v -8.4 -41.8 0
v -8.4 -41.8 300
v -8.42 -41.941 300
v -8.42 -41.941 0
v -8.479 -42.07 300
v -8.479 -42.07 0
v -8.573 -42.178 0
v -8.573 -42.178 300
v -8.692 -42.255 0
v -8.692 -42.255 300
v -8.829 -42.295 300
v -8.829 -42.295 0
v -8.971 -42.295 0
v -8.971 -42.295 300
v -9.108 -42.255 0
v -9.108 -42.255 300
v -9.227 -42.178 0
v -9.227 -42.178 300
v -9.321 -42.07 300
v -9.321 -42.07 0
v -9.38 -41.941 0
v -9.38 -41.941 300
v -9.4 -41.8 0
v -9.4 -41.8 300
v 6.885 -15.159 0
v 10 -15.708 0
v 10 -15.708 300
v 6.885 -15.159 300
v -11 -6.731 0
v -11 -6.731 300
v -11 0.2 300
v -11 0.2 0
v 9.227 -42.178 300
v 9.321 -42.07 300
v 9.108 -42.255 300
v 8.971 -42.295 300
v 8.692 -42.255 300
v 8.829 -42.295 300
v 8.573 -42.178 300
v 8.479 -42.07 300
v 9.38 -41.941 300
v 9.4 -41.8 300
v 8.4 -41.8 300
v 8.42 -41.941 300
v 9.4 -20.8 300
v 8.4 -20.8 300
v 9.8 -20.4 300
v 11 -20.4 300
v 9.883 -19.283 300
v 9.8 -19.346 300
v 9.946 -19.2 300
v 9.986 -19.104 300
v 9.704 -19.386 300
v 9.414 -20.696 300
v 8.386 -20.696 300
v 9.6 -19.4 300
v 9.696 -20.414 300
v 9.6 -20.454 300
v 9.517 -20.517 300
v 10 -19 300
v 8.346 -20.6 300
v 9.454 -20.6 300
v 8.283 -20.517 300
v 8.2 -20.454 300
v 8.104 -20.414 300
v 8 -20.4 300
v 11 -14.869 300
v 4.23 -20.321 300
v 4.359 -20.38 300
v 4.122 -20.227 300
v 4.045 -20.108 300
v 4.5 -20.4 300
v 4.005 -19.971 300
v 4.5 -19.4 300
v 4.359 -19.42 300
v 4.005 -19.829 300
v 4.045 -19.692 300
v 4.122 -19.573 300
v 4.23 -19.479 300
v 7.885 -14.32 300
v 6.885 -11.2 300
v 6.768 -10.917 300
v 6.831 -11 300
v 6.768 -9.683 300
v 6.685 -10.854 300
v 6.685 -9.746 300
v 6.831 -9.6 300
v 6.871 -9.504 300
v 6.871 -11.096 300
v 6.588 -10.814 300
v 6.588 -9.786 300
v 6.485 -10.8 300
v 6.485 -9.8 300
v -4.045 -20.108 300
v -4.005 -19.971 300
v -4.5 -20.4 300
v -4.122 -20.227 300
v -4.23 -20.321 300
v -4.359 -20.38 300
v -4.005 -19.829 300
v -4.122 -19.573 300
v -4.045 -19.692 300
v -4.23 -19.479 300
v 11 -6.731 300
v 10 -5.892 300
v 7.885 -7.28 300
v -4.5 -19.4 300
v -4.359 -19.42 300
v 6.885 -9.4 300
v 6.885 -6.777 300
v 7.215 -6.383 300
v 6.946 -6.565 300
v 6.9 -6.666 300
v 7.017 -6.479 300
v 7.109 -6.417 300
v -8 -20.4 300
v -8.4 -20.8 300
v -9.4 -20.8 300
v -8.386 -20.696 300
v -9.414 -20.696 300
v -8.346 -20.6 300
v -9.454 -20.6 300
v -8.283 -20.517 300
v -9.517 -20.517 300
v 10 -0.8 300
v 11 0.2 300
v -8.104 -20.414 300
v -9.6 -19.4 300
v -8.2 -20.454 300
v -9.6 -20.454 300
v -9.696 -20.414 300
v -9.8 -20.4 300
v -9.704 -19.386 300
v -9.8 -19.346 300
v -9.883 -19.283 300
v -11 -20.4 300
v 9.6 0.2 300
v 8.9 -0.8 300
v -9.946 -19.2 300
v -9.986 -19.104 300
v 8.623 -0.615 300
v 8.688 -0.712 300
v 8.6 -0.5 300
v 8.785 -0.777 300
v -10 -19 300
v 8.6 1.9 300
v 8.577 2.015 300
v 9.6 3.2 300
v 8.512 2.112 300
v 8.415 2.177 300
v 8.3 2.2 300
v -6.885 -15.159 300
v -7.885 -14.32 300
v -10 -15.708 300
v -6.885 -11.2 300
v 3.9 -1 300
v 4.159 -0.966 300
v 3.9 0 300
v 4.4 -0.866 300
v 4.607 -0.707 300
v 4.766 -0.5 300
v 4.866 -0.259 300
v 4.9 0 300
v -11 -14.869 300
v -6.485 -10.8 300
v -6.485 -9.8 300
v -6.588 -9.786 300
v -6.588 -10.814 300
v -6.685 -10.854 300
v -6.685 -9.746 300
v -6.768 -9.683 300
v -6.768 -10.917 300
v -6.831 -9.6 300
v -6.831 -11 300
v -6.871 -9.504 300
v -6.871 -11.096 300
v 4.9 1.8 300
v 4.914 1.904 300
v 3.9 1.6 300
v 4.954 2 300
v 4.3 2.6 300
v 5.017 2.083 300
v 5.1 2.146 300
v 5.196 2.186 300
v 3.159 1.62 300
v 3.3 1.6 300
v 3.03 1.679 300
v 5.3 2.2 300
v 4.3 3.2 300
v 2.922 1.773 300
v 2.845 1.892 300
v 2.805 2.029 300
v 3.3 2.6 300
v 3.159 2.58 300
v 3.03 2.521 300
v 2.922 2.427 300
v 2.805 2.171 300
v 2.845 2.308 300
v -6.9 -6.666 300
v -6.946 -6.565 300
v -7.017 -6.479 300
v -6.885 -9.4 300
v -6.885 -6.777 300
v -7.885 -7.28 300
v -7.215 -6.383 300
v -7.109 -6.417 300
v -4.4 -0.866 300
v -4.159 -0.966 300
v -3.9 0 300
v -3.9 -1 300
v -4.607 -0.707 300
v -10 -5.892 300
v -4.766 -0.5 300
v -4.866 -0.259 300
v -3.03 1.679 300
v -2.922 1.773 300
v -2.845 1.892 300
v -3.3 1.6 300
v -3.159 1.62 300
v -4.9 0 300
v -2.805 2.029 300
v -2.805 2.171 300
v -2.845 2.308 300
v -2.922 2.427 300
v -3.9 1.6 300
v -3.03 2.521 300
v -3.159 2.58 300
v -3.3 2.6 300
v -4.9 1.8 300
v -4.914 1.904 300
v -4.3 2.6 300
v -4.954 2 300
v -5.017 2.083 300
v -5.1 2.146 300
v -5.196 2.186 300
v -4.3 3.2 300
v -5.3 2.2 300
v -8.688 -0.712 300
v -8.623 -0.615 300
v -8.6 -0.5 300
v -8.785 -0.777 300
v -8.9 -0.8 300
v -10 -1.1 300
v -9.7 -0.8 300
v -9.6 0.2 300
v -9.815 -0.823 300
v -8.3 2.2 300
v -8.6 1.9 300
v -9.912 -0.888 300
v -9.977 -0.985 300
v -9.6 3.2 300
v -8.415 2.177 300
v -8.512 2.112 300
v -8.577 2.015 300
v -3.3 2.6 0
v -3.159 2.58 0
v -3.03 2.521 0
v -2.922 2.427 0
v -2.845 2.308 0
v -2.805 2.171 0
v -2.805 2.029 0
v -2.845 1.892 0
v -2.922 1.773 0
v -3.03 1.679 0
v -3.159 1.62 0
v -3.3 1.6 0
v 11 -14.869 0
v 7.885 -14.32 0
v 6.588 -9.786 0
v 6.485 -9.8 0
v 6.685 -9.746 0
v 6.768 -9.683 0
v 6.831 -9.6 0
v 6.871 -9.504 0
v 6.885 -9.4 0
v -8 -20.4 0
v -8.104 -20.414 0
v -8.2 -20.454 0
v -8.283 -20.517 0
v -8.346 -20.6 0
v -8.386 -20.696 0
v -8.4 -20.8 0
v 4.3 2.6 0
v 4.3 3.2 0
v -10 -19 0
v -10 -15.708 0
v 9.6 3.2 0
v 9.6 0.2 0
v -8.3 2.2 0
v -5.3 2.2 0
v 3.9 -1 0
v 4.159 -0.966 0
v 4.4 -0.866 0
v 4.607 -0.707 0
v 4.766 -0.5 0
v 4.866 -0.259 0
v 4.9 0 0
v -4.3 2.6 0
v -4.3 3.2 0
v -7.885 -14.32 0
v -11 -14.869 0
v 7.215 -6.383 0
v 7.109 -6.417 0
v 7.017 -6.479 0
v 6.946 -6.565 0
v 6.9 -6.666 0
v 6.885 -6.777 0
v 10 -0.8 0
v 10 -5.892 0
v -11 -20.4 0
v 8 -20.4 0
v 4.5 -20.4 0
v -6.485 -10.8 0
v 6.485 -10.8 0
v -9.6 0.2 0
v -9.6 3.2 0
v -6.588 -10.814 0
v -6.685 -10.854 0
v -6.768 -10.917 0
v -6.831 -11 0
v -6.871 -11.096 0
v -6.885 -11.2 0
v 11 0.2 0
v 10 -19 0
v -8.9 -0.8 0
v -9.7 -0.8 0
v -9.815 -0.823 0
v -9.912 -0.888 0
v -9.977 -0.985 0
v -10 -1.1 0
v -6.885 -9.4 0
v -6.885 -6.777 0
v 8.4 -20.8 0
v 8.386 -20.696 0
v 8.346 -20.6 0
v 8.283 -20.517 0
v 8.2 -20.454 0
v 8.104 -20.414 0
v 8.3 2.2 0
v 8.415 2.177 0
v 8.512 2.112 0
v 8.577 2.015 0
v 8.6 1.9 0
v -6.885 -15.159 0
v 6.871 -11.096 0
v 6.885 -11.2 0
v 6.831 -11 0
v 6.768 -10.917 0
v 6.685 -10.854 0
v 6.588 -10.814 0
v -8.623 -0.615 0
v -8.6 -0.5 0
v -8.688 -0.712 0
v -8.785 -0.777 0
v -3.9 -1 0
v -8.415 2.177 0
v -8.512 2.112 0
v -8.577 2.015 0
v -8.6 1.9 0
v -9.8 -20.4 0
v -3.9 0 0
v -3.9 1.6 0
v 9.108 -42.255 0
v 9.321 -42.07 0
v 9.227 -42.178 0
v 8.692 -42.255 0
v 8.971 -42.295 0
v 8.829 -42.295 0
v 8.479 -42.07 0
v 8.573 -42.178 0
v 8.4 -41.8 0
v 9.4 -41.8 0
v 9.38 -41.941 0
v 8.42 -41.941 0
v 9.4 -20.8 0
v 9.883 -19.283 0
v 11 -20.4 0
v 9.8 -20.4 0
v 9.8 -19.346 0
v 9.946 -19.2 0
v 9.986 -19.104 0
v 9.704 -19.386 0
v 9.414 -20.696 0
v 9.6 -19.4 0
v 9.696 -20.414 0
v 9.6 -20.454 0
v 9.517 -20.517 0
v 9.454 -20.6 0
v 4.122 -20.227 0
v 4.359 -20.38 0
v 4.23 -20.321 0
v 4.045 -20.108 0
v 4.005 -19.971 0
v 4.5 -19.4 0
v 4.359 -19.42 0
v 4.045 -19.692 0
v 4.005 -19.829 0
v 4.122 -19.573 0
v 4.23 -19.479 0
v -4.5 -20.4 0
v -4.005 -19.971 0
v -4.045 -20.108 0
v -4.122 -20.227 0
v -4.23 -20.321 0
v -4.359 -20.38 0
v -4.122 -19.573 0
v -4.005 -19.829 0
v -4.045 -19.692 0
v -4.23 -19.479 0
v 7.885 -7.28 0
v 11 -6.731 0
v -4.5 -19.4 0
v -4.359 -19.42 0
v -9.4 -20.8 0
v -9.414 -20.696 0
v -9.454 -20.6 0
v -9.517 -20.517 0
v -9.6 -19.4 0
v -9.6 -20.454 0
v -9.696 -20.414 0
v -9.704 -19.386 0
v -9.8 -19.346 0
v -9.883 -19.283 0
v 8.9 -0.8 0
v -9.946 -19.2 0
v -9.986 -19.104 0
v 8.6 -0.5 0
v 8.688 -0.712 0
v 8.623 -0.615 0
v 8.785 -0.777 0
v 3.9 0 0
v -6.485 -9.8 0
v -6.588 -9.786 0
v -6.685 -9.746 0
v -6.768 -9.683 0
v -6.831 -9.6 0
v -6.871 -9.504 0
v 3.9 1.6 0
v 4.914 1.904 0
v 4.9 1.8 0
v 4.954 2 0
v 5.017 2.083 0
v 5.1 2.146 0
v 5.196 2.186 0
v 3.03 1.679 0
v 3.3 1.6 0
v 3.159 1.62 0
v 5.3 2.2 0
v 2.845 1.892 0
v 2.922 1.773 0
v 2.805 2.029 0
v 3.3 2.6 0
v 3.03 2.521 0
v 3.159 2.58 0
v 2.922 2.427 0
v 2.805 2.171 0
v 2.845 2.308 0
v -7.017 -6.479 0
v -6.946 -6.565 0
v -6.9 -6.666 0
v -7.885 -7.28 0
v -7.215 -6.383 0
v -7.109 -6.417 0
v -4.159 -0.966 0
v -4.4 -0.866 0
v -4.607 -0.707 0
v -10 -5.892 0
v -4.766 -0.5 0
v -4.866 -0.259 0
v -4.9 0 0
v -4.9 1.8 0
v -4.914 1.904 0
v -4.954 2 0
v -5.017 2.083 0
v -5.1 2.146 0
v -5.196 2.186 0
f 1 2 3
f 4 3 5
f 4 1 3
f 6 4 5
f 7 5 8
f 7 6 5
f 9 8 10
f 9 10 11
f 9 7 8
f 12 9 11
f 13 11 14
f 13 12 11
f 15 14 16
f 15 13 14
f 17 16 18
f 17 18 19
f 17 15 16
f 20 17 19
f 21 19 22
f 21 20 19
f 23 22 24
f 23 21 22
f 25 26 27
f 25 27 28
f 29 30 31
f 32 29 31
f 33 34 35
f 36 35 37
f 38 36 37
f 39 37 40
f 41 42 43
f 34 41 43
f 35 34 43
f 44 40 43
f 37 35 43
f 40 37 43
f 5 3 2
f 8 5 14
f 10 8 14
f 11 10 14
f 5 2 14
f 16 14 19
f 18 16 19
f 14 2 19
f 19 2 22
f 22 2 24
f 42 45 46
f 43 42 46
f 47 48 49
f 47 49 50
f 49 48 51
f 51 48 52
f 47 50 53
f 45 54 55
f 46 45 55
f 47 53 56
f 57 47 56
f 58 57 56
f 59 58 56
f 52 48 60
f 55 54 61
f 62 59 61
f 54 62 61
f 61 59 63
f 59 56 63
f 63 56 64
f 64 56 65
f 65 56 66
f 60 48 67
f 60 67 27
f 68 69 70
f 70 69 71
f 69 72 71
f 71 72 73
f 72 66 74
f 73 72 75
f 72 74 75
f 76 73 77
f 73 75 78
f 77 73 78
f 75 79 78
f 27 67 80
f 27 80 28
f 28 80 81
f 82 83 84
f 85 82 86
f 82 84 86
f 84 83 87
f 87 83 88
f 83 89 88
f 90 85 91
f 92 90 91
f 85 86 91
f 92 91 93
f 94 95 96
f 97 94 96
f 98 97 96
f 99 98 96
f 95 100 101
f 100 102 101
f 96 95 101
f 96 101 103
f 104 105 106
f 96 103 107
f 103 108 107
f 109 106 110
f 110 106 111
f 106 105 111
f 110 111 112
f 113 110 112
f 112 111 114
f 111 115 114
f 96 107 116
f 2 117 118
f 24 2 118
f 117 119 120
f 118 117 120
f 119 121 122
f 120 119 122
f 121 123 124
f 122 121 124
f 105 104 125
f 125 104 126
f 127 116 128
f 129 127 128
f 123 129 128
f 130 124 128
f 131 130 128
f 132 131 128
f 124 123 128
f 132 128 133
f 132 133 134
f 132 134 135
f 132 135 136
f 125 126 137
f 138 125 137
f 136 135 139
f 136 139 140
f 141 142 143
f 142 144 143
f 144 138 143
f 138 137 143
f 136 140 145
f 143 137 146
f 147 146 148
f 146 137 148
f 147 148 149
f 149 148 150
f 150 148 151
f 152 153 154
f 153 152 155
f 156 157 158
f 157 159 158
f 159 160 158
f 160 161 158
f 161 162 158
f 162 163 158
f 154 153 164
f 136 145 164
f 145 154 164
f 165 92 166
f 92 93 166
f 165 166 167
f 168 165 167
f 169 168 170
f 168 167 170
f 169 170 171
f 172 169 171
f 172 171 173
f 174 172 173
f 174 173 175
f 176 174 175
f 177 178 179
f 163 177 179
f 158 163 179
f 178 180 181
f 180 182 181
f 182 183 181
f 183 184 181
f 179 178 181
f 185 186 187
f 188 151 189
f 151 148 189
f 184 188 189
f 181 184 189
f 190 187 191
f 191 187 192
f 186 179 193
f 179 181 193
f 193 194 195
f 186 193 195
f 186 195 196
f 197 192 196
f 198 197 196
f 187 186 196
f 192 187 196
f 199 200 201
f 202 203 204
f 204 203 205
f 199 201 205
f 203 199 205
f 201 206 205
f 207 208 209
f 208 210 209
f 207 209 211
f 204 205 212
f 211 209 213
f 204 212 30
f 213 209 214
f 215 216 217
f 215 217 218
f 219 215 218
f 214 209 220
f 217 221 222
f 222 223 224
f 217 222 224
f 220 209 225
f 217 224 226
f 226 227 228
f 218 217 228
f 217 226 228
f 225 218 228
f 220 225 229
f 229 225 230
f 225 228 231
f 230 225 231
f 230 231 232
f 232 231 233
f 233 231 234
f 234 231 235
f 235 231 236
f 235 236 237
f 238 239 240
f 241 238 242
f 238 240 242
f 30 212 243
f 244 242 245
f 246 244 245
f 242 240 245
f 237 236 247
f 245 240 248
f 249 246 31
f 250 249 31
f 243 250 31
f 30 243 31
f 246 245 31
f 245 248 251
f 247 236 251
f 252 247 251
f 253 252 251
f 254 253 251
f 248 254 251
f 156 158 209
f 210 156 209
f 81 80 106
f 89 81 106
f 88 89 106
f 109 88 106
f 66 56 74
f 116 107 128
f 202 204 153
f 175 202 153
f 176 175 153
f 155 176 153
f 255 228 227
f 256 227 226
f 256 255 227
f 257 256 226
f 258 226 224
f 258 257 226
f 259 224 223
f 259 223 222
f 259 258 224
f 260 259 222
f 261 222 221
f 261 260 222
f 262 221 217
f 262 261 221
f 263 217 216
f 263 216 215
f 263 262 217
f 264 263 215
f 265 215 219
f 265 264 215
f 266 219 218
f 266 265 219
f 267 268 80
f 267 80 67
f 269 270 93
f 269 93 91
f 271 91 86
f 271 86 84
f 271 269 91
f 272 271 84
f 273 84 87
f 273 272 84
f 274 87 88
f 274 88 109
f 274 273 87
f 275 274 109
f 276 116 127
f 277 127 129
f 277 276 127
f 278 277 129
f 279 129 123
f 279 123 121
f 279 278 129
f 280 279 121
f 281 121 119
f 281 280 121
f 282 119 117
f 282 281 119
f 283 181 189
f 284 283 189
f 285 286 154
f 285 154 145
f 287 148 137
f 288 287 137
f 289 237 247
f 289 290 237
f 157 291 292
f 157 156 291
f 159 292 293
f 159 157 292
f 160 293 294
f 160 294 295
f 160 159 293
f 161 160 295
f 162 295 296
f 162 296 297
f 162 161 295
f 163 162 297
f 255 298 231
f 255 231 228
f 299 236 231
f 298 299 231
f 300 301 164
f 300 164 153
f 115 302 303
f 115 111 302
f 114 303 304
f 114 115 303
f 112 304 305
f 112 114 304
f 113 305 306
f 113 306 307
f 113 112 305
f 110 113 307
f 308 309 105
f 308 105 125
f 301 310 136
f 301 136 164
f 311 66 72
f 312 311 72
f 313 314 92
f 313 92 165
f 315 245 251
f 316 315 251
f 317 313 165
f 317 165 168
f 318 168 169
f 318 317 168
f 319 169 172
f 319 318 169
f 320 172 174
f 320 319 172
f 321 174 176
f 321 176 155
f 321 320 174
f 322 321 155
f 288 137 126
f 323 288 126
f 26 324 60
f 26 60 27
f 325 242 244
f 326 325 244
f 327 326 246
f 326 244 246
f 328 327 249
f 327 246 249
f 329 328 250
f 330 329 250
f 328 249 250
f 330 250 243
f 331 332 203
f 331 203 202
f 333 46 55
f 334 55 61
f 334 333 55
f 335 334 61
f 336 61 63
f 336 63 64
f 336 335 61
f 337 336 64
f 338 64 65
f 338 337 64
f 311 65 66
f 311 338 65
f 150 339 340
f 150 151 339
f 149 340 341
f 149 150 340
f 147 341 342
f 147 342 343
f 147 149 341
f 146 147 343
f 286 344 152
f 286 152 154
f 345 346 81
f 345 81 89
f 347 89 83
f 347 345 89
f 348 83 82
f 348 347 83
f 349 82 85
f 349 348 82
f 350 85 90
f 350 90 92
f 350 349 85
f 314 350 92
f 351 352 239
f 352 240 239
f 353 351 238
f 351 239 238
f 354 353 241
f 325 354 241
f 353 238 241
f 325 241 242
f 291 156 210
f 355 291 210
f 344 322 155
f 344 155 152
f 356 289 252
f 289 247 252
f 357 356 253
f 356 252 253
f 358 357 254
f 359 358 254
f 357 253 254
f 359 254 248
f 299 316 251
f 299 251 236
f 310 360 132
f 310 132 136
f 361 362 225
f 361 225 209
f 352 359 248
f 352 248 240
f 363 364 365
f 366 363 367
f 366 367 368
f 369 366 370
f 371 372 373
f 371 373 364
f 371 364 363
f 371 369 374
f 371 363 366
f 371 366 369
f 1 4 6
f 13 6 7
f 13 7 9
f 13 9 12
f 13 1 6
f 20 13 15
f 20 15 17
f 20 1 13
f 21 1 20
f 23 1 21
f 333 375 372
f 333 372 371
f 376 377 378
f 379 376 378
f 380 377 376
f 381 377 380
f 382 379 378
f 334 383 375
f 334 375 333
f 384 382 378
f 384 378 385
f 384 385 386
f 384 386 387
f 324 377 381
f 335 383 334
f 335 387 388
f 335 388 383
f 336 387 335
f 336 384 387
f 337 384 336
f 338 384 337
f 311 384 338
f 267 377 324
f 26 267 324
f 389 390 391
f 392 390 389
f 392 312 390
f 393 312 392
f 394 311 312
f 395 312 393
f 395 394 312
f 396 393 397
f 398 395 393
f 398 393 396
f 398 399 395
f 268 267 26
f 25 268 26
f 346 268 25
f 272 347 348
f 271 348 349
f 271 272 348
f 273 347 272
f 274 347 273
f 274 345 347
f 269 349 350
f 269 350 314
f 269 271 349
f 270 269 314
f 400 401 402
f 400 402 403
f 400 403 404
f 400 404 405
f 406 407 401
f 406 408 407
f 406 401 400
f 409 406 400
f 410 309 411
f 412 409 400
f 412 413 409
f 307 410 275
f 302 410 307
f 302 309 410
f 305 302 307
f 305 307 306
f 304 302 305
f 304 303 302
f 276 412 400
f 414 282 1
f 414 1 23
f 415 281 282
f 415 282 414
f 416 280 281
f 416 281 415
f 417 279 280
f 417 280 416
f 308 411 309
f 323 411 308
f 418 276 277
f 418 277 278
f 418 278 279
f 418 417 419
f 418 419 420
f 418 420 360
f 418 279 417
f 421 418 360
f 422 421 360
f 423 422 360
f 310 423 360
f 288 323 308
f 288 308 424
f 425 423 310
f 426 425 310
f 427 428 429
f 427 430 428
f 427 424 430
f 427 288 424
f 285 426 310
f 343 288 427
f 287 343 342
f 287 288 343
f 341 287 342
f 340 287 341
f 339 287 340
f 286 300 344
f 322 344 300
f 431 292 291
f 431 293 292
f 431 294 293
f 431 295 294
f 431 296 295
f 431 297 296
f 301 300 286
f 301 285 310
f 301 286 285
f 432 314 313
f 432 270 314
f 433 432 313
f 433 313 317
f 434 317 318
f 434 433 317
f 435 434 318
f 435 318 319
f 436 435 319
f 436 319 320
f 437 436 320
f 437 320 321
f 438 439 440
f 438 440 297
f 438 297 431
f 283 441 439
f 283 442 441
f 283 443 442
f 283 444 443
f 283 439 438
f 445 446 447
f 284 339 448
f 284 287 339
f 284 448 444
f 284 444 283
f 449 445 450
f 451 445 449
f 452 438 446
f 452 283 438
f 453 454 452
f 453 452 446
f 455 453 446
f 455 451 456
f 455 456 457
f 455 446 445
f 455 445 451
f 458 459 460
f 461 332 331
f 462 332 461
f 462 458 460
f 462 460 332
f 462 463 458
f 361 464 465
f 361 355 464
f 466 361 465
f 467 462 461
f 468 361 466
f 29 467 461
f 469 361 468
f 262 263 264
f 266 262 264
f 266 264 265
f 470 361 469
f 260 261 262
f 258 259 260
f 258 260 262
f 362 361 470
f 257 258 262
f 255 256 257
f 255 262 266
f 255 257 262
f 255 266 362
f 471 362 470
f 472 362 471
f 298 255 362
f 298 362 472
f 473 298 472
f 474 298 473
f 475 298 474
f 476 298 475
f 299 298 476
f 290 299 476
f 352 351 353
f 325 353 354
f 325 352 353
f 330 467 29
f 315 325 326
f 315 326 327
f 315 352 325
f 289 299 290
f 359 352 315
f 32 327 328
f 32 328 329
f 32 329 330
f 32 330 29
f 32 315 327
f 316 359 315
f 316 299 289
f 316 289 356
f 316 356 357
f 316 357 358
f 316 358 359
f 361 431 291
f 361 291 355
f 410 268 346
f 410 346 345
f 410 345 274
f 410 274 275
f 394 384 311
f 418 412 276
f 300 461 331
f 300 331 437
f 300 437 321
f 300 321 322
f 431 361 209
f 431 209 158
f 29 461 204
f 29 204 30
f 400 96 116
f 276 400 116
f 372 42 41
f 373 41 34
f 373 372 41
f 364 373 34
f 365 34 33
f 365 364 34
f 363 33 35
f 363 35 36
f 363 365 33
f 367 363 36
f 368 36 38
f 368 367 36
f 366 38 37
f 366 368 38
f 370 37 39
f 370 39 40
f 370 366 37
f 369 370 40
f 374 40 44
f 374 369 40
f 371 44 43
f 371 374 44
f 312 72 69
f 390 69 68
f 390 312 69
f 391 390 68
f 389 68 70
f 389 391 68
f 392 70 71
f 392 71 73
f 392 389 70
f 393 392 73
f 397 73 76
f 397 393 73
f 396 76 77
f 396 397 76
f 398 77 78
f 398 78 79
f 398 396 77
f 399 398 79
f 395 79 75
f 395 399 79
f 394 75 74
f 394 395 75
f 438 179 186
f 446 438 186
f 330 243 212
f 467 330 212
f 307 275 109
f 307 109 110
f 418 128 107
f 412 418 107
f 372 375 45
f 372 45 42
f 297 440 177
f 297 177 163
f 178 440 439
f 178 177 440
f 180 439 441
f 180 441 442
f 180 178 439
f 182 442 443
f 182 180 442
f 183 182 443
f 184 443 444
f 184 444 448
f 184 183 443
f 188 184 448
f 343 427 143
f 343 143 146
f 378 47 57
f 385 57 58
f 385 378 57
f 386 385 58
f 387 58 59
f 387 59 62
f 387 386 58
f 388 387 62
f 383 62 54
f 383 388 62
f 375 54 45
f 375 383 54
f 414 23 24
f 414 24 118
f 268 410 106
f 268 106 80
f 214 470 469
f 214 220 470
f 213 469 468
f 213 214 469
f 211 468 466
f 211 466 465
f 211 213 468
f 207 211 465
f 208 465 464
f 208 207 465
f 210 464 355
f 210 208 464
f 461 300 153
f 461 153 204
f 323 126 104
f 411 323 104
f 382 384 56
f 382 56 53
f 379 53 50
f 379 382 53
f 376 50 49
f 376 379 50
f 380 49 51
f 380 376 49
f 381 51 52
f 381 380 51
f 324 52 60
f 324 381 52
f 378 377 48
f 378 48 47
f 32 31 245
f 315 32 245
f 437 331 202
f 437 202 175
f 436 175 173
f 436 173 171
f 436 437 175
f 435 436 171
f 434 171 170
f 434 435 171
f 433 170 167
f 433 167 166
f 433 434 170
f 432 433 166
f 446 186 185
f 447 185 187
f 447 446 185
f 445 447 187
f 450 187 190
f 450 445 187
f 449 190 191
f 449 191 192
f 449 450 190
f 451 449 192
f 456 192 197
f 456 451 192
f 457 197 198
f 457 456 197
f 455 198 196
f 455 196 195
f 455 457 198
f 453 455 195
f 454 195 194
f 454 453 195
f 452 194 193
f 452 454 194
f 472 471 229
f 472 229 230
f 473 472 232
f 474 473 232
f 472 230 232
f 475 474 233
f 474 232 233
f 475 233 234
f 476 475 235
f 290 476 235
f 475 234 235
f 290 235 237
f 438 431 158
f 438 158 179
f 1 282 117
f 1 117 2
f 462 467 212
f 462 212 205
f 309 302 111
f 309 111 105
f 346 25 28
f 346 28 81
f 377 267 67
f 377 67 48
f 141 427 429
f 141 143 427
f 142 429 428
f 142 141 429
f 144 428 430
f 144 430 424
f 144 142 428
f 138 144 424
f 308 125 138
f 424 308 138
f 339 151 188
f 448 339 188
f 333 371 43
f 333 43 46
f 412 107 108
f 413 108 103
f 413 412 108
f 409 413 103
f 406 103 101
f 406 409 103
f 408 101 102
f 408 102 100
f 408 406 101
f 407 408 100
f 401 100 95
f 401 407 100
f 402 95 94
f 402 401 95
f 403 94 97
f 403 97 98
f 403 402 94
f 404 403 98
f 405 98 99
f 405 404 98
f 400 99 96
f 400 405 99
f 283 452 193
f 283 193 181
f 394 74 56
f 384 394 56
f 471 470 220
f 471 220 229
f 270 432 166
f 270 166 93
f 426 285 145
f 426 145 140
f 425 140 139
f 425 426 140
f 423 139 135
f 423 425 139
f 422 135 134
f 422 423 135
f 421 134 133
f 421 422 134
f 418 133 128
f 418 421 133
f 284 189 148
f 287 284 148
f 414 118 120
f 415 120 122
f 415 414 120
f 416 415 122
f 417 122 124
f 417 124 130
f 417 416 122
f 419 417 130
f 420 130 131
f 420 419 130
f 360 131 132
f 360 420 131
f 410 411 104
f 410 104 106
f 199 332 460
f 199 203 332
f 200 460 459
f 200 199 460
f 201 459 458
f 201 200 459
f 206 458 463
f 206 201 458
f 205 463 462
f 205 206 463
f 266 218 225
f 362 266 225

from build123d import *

# Parameters (mm, degrees)
BOSS_EXTRUDE1_DEPTH = 300
FILLET1_R           = 1
FILLET2_R           = 0.3
SKETCH3_W           = 0.4
SKETCH3_H           = 0.6
CUT_EXTRUDE1_DEPTH  = 300
FILLET3_R           = 0.4


with BuildPart() as part:
    # Sketch1 → Boss-Extrude1 (new body)
    with BuildSketch(Plane.XY):
        with BuildLine():
            Line((-3.9, 0), (3.9, 0))
            Line((3.9, 0), (3.9, 1.6))
            Line((3.9, 1.6), (3.3, 1.6))
            ThreePointArc((3.3, 1.6), (2.8, 2.1), (3.3, 2.6))
            Line((3.3, 2.6), (4.3, 2.6))
            Line((4.3, 2.6), (4.3, 3.2))
            Line((4.3, 3.2), (9.6, 3.2))
            Line((9.6, 3.2), (9.6, 0.2))
            Line((9.6, 0.2), (11, 0.2))
            Line((11, 0.2), (11, -6.730696291))
            Line((11, -6.730696291), (7.88474386, -7.28))
            Line((7.88474386, -7.28), (7.88474386, -14.32))
            Line((7.88474386, -14.32), (11, -14.869303709))
            Line((11, -14.869303709), (11, -20.4))
            Line((11, -20.4), (9.8, -20.4))
            ThreePointArc((9.8, -20.4), (9.517157288, -20.517157288), (9.4, -20.8))
            Line((9.4, -20.8), (9.4, -41.8))
            ThreePointArc((9.4, -41.8), (8.9, -42.3), (8.4, -41.8))
            Line((8.4, -41.8), (8.4, -20.8))
            ThreePointArc((8.4, -20.8), (8.282842712, -20.517157288), (8, -20.4))
            Line((8, -20.4), (4.5, -20.4))
            ThreePointArc((4.5, -20.4), (4, -19.9), (4.5, -19.4))
            Line((4.5, -19.4), (8.4, -19.4))
            Line((8.4, -19.4), (9.6, -19.4))
            ThreePointArc((9.6, -19.4), (9.882842712, -19.282842712), (10, -19))
            Line((10, -19), (10, -15.70840334))
            Line((10, -15.70840334), (6.88474386, -15.159099631))
            Line((6.88474386, -15.159099631), (6.88474386, -11.2))
            ThreePointArc((6.88474386, -11.2), (6.767586572, -10.917157288), (6.48474386, -10.8))
            Line((6.48474386, -10.8), (-6.48474386, -10.8))
            ThreePointArc((-6.48474386, -10.8), (-6.767586572, -10.917157288), (-6.88474386, -11.2))
            Line((-6.88474386, -11.2), (-6.88474386, -15.159099631))
            Line((-6.88474386, -15.159099631), (-10, -15.70840334))
            Line((-10, -15.70840334), (-10, -19))
            ThreePointArc((-10, -19), (-9.882842712, -19.282842712), (-9.6, -19.4))
            Line((-9.6, -19.4), (-8.4, -19.4))
            Line((-8.4, -19.4), (-4.5, -19.4))
            ThreePointArc((-4.5, -19.4), (-4, -19.9), (-4.5, -20.4))
            Line((-4.5, -20.4), (-8, -20.4))
            ThreePointArc((-8, -20.4), (-8.282842712, -20.517157288), (-8.4, -20.8))
            Line((-8.4, -20.8), (-8.4, -41.8))
            ThreePointArc((-8.4, -41.8), (-8.9, -42.3), (-9.4, -41.8))
            Line((-9.4, -41.8), (-9.4, -20.8))
            ThreePointArc((-9.4, -20.8), (-9.517157288, -20.517157288), (-9.8, -20.4))
            Line((-9.8, -20.4), (-11, -20.4))
            Line((-11, -20.4), (-11, -14.869303709))
            Line((-11, -14.869303709), (-7.88474386, -14.32))
            Line((-7.88474386, -14.32), (-7.88474386, -7.28))
            Line((-7.88474386, -7.28), (-11, -6.730696291))
            Line((-11, -6.730696291), (-11, 0.2))
            Line((-11, 0.2), (-9.6, 0.2))
            Line((-9.6, 0.2), (-9.6, 3.2))
            Line((-9.6, 3.2), (-4.3, 3.2))
            Line((-4.3, 3.2), (-4.3, 2.6))
            Line((-4.3, 2.6), (-3.3, 2.6))
            ThreePointArc((-3.3, 2.6), (-2.8, 2.1), (-3.3, 1.6))
            Line((-3.3, 1.6), (-3.9, 1.6))
            Line((-3.9, 1.6), (-3.9, 0))
        make_face()
        with BuildLine():
            Line((-6.88474386, -6.440900369), (-6.88474386, -9.4))
            ThreePointArc((-6.88474386, -9.4), (-6.767586572, -9.682842712), (-6.48474386, -9.8))
            Line((-6.48474386, -9.8), (6.48474386, -9.8))
            ThreePointArc((6.48474386, -9.8), (6.767586572, -9.682842712), (6.88474386, -9.4))
            Line((6.88474386, -9.4), (6.88474386, -6.440900369))
            Line((6.88474386, -6.440900369), (10, -5.89159666))
            Line((10, -5.89159666), (10, -0.8))
            Line((10, -0.8), (8.6, -0.8))
            Line((8.6, -0.8), (8.6, 2.2))
            Line((8.6, 2.2), (5.3, 2.2))
            Line((5.3, 2.2), (5.3, 1.6))
            Line((5.3, 1.6), (4.9, 1.6))
            Line((4.9, 1.6), (4.9, -1))
            Line((4.9, -1), (-4.9, -1))
            Line((-4.9, -1), (-4.9, 1.6))
            Line((-4.9, 1.6), (-5.3, 1.6))
            Line((-5.3, 1.6), (-5.3, 2.2))
            Line((-5.3, 2.2), (-8.6, 2.2))
            Line((-8.6, 2.2), (-8.6, -0.8))
            Line((-8.6, -0.8), (-10, -0.8))
            Line((-10, -0.8), (-10, -5.89159666))
            Line((-10, -5.89159666), (-6.88474386, -6.440900369))
        make_face(mode=Mode.SUBTRACT)
    extrude(amount=BOSS_EXTRUDE1_DEPTH)

    # Fillet1
    fillet1_edges = [part.edges().sort_by_distance(p)[0] for p in [
        (4.9, -1, 150),
        (-4.9, -1, 150),
    ]]
    fillet(fillet1_edges, radius=FILLET1_R)

    # Fillet2
    fillet2_edges = [part.edges().sort_by_distance(p)[0] for p in [
        (8.6, -0.8, 150),
        (8.6, 2.2, 150),
        (-8.6, 2.2, 150),
        (-8.6, -0.8, 150),
        (-10, -0.8, 150),
    ]]
    fillet(fillet2_edges, radius=FILLET2_R)

    # Sketch3 → Cut-Extrude1 (cut)
    with BuildSketch(Plane(origin=(0, 0, 0), x_dir=(-1, 0, 0), z_dir=(0, 0, -1))):
        with Locations((5.1, 1.9)):
            Rectangle(SKETCH3_W, SKETCH3_H)
        with Locations((-5.1, 1.9)):
            Rectangle(SKETCH3_W, SKETCH3_H)
    extrude(amount=-CUT_EXTRUDE1_DEPTH, mode=Mode.SUBTRACT)

    # Fillet3
    fillet3_edges = [part.edges().sort_by_distance(p)[0] for p in [
        (-6.88474386, -6.440900369, 150),
        (6.88474386, -6.440900369, 150),
        (-4.9, 2.2, 150),
        (4.9, 2.2, 150),
    ]]
    fillet(fillet3_edges, radius=FILLET3_R)


solid = part.part
